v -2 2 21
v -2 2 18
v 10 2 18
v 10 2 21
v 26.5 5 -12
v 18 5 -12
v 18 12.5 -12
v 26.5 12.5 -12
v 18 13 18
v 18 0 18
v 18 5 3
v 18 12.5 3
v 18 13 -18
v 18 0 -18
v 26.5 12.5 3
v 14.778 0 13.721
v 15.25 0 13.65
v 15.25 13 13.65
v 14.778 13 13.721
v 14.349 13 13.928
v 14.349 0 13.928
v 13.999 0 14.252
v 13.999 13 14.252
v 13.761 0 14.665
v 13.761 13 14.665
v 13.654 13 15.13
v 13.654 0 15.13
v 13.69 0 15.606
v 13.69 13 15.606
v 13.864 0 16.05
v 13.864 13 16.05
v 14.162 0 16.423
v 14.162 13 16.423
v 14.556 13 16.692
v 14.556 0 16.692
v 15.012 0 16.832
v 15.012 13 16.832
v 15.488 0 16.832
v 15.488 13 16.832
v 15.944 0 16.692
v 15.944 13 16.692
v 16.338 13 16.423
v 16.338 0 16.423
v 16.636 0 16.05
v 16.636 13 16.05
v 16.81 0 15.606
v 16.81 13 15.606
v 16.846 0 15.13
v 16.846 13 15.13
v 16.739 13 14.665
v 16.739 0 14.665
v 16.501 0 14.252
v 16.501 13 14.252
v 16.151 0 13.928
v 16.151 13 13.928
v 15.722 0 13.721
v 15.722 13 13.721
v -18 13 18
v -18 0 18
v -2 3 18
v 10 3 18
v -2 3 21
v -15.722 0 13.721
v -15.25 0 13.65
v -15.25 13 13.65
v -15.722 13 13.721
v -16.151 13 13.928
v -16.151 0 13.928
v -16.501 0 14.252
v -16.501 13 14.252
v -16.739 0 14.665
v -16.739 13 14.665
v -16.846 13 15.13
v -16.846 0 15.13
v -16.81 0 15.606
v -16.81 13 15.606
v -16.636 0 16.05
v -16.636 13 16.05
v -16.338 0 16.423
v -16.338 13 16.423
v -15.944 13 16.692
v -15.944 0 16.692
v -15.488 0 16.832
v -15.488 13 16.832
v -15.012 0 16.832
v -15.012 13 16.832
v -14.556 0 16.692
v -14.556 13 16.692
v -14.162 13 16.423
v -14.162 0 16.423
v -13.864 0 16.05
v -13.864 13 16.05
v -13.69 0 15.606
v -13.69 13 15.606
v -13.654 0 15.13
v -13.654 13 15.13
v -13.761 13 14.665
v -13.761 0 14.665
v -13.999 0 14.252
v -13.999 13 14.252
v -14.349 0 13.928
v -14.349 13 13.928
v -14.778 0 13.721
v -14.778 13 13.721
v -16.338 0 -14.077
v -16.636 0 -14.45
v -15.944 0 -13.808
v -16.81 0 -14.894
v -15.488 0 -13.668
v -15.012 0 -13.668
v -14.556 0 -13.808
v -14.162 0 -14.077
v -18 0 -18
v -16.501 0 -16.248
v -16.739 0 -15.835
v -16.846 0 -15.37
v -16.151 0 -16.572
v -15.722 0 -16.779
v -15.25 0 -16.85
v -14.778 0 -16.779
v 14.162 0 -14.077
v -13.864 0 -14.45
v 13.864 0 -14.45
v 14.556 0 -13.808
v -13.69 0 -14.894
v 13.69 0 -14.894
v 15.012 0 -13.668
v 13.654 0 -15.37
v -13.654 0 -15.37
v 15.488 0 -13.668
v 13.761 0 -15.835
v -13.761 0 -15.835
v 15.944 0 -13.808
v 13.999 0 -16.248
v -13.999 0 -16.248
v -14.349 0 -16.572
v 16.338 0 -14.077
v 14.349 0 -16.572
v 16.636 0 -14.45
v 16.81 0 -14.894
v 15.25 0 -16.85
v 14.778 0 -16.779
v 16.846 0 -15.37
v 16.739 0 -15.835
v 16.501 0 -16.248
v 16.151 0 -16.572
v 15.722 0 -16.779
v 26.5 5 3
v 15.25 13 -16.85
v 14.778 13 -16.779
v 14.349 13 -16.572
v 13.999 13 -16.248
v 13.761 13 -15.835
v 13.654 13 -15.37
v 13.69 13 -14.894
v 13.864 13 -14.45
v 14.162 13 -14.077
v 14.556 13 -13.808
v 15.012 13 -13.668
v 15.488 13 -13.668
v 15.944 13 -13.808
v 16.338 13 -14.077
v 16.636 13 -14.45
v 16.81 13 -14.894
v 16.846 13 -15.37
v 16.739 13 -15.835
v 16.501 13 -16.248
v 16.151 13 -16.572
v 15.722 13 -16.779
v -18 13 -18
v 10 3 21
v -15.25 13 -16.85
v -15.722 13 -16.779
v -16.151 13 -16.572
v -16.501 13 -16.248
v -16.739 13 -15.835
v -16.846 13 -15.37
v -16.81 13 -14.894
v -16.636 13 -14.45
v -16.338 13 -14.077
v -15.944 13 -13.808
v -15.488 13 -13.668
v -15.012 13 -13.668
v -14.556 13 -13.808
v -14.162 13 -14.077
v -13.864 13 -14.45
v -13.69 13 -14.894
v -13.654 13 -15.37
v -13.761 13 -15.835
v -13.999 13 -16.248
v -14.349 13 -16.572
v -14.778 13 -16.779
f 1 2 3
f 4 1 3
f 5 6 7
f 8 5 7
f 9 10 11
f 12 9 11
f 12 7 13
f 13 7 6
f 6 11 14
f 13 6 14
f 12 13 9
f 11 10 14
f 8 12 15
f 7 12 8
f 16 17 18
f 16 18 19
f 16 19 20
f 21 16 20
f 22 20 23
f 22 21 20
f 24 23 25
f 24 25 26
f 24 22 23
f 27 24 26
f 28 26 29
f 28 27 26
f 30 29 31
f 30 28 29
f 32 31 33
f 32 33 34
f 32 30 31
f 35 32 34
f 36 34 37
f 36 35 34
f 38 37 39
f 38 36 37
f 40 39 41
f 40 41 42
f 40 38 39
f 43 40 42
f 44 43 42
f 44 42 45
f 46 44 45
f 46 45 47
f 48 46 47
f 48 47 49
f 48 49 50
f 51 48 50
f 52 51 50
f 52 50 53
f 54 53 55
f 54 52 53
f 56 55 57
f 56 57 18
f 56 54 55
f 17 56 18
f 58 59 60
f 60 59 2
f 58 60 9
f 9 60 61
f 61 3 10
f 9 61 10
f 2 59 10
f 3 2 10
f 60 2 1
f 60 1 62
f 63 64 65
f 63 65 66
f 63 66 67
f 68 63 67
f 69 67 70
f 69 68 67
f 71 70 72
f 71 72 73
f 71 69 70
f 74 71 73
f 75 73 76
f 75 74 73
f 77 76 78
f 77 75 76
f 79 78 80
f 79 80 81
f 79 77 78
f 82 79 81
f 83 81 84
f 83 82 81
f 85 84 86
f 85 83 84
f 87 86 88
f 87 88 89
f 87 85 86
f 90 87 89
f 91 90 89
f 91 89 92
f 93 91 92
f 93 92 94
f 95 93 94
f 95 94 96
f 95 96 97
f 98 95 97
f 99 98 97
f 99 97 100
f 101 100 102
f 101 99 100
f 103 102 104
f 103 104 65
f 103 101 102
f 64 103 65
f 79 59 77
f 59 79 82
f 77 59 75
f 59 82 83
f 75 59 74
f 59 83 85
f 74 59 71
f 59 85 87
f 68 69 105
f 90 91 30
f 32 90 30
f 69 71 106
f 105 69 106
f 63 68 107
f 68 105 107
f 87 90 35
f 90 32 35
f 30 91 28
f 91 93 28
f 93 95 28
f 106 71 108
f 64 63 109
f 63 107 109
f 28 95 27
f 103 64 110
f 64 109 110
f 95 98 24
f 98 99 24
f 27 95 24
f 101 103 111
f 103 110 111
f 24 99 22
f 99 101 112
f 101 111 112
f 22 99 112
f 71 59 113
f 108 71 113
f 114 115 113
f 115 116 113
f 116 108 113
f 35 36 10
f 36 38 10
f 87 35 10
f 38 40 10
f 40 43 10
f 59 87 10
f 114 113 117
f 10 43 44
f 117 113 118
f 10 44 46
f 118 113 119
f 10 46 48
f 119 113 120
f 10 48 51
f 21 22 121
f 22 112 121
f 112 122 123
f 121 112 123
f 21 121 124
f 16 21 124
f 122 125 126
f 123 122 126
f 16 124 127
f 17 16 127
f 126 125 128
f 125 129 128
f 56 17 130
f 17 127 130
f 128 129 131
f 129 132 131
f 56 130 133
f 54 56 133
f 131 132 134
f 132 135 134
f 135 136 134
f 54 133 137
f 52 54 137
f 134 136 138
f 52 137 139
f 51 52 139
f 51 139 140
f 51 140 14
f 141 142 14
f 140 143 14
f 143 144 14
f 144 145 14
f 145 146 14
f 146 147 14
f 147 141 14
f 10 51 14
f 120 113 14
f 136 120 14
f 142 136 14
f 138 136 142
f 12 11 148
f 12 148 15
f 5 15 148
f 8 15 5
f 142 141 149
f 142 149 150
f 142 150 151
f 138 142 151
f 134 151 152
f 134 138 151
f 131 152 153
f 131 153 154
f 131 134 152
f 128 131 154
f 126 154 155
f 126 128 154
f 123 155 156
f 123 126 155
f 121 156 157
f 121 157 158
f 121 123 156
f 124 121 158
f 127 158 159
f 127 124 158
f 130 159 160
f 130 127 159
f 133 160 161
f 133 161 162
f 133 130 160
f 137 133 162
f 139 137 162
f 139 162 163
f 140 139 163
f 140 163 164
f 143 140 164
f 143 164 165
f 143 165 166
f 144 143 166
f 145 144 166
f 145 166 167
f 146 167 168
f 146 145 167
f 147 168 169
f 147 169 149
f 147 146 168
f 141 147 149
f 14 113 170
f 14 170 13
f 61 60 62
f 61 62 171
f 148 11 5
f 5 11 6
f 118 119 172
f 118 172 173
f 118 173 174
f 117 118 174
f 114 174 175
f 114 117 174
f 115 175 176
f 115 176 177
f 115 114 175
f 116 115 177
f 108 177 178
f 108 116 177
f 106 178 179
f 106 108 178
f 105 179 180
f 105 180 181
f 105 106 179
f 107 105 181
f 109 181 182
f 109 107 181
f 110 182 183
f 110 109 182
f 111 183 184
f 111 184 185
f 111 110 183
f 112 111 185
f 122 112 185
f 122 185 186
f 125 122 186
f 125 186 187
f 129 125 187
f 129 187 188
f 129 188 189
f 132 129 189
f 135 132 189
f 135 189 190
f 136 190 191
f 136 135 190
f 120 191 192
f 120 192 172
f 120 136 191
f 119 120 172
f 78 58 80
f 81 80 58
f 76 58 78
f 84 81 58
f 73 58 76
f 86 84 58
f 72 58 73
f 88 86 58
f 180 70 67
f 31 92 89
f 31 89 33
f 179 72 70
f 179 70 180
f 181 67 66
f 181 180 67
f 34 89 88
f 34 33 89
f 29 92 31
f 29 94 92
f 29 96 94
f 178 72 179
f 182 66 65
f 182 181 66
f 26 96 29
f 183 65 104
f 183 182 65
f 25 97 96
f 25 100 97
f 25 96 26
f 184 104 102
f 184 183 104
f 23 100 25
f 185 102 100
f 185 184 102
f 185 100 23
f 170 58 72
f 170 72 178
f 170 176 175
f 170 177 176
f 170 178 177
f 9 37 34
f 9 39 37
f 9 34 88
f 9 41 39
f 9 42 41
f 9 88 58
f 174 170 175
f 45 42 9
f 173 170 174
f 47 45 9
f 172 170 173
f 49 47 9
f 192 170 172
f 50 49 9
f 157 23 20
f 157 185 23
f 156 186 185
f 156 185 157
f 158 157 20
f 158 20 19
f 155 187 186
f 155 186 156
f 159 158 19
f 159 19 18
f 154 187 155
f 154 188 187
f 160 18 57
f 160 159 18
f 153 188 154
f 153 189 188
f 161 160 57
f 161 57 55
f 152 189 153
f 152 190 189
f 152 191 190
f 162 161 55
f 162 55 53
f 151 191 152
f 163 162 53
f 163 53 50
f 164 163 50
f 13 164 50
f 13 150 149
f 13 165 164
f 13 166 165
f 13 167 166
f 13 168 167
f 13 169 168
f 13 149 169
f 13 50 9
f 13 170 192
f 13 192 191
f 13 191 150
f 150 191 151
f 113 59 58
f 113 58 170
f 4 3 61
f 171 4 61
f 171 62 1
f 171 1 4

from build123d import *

# Parameters (mm, degrees)
SKETCH1_W           = 36
SKETCH1_H           = 36
SKETCH1_R           = 1.6
BOSS_EXTRUDE1_DEPTH = 13
SKETCH2_W           = 15
SKETCH2_H           = 7.5
BOSS_EXTRUDE2_DEPTH = 8.5
SKETCH3_W           = 12
SKETCH3_H           = 1
BOSS_EXTRUDE3_DEPTH = 3


with BuildPart() as part:
    # Sketch1 → Boss-Extrude1 (new body)
    with BuildSketch(Plane(origin=(0, 0, 0), x_dir=(1, 0, 0), z_dir=(0, 1, 0))):
        Rectangle(SKETCH1_W, SKETCH1_H)
        with Locations(Location((-15.25, 15.25, 0), (0, 0, 90))):
            Circle(SKETCH1_R, mode=Mode.SUBTRACT)
        with Locations(Location((15.25, 15.25, 0), (0, 0, 90))):
            Circle(SKETCH1_R, mode=Mode.SUBTRACT)
        with Locations(Location((15.25, -15.25, 0), (0, 0, 90))):
            Circle(SKETCH1_R, mode=Mode.SUBTRACT)
        with Locations(Location((-15.25, -15.25, 0), (0, 0, 90))):
            Circle(SKETCH1_R, mode=Mode.SUBTRACT)
    extrude(amount=BOSS_EXTRUDE1_DEPTH)

    # Sketch2 → Boss-Extrude2 (add)
    with BuildSketch(Plane(origin=(18, 0, 0), x_dir=(0, 0, -1), z_dir=(1, 0, 0))):
        with Locations((4.5, 8.75)):
            Rectangle(SKETCH2_W, SKETCH2_H)
    extrude(amount=BOSS_EXTRUDE2_DEPTH)

    # Sketch3 → Boss-Extrude3 (add)
    with BuildSketch(Plane.XY.offset(18)):
        with Locations((4, 2.5)):
            Rectangle(SKETCH3_W, SKETCH3_H)
    extrude(amount=BOSS_EXTRUDE3_DEPTH)


solid = part.part
